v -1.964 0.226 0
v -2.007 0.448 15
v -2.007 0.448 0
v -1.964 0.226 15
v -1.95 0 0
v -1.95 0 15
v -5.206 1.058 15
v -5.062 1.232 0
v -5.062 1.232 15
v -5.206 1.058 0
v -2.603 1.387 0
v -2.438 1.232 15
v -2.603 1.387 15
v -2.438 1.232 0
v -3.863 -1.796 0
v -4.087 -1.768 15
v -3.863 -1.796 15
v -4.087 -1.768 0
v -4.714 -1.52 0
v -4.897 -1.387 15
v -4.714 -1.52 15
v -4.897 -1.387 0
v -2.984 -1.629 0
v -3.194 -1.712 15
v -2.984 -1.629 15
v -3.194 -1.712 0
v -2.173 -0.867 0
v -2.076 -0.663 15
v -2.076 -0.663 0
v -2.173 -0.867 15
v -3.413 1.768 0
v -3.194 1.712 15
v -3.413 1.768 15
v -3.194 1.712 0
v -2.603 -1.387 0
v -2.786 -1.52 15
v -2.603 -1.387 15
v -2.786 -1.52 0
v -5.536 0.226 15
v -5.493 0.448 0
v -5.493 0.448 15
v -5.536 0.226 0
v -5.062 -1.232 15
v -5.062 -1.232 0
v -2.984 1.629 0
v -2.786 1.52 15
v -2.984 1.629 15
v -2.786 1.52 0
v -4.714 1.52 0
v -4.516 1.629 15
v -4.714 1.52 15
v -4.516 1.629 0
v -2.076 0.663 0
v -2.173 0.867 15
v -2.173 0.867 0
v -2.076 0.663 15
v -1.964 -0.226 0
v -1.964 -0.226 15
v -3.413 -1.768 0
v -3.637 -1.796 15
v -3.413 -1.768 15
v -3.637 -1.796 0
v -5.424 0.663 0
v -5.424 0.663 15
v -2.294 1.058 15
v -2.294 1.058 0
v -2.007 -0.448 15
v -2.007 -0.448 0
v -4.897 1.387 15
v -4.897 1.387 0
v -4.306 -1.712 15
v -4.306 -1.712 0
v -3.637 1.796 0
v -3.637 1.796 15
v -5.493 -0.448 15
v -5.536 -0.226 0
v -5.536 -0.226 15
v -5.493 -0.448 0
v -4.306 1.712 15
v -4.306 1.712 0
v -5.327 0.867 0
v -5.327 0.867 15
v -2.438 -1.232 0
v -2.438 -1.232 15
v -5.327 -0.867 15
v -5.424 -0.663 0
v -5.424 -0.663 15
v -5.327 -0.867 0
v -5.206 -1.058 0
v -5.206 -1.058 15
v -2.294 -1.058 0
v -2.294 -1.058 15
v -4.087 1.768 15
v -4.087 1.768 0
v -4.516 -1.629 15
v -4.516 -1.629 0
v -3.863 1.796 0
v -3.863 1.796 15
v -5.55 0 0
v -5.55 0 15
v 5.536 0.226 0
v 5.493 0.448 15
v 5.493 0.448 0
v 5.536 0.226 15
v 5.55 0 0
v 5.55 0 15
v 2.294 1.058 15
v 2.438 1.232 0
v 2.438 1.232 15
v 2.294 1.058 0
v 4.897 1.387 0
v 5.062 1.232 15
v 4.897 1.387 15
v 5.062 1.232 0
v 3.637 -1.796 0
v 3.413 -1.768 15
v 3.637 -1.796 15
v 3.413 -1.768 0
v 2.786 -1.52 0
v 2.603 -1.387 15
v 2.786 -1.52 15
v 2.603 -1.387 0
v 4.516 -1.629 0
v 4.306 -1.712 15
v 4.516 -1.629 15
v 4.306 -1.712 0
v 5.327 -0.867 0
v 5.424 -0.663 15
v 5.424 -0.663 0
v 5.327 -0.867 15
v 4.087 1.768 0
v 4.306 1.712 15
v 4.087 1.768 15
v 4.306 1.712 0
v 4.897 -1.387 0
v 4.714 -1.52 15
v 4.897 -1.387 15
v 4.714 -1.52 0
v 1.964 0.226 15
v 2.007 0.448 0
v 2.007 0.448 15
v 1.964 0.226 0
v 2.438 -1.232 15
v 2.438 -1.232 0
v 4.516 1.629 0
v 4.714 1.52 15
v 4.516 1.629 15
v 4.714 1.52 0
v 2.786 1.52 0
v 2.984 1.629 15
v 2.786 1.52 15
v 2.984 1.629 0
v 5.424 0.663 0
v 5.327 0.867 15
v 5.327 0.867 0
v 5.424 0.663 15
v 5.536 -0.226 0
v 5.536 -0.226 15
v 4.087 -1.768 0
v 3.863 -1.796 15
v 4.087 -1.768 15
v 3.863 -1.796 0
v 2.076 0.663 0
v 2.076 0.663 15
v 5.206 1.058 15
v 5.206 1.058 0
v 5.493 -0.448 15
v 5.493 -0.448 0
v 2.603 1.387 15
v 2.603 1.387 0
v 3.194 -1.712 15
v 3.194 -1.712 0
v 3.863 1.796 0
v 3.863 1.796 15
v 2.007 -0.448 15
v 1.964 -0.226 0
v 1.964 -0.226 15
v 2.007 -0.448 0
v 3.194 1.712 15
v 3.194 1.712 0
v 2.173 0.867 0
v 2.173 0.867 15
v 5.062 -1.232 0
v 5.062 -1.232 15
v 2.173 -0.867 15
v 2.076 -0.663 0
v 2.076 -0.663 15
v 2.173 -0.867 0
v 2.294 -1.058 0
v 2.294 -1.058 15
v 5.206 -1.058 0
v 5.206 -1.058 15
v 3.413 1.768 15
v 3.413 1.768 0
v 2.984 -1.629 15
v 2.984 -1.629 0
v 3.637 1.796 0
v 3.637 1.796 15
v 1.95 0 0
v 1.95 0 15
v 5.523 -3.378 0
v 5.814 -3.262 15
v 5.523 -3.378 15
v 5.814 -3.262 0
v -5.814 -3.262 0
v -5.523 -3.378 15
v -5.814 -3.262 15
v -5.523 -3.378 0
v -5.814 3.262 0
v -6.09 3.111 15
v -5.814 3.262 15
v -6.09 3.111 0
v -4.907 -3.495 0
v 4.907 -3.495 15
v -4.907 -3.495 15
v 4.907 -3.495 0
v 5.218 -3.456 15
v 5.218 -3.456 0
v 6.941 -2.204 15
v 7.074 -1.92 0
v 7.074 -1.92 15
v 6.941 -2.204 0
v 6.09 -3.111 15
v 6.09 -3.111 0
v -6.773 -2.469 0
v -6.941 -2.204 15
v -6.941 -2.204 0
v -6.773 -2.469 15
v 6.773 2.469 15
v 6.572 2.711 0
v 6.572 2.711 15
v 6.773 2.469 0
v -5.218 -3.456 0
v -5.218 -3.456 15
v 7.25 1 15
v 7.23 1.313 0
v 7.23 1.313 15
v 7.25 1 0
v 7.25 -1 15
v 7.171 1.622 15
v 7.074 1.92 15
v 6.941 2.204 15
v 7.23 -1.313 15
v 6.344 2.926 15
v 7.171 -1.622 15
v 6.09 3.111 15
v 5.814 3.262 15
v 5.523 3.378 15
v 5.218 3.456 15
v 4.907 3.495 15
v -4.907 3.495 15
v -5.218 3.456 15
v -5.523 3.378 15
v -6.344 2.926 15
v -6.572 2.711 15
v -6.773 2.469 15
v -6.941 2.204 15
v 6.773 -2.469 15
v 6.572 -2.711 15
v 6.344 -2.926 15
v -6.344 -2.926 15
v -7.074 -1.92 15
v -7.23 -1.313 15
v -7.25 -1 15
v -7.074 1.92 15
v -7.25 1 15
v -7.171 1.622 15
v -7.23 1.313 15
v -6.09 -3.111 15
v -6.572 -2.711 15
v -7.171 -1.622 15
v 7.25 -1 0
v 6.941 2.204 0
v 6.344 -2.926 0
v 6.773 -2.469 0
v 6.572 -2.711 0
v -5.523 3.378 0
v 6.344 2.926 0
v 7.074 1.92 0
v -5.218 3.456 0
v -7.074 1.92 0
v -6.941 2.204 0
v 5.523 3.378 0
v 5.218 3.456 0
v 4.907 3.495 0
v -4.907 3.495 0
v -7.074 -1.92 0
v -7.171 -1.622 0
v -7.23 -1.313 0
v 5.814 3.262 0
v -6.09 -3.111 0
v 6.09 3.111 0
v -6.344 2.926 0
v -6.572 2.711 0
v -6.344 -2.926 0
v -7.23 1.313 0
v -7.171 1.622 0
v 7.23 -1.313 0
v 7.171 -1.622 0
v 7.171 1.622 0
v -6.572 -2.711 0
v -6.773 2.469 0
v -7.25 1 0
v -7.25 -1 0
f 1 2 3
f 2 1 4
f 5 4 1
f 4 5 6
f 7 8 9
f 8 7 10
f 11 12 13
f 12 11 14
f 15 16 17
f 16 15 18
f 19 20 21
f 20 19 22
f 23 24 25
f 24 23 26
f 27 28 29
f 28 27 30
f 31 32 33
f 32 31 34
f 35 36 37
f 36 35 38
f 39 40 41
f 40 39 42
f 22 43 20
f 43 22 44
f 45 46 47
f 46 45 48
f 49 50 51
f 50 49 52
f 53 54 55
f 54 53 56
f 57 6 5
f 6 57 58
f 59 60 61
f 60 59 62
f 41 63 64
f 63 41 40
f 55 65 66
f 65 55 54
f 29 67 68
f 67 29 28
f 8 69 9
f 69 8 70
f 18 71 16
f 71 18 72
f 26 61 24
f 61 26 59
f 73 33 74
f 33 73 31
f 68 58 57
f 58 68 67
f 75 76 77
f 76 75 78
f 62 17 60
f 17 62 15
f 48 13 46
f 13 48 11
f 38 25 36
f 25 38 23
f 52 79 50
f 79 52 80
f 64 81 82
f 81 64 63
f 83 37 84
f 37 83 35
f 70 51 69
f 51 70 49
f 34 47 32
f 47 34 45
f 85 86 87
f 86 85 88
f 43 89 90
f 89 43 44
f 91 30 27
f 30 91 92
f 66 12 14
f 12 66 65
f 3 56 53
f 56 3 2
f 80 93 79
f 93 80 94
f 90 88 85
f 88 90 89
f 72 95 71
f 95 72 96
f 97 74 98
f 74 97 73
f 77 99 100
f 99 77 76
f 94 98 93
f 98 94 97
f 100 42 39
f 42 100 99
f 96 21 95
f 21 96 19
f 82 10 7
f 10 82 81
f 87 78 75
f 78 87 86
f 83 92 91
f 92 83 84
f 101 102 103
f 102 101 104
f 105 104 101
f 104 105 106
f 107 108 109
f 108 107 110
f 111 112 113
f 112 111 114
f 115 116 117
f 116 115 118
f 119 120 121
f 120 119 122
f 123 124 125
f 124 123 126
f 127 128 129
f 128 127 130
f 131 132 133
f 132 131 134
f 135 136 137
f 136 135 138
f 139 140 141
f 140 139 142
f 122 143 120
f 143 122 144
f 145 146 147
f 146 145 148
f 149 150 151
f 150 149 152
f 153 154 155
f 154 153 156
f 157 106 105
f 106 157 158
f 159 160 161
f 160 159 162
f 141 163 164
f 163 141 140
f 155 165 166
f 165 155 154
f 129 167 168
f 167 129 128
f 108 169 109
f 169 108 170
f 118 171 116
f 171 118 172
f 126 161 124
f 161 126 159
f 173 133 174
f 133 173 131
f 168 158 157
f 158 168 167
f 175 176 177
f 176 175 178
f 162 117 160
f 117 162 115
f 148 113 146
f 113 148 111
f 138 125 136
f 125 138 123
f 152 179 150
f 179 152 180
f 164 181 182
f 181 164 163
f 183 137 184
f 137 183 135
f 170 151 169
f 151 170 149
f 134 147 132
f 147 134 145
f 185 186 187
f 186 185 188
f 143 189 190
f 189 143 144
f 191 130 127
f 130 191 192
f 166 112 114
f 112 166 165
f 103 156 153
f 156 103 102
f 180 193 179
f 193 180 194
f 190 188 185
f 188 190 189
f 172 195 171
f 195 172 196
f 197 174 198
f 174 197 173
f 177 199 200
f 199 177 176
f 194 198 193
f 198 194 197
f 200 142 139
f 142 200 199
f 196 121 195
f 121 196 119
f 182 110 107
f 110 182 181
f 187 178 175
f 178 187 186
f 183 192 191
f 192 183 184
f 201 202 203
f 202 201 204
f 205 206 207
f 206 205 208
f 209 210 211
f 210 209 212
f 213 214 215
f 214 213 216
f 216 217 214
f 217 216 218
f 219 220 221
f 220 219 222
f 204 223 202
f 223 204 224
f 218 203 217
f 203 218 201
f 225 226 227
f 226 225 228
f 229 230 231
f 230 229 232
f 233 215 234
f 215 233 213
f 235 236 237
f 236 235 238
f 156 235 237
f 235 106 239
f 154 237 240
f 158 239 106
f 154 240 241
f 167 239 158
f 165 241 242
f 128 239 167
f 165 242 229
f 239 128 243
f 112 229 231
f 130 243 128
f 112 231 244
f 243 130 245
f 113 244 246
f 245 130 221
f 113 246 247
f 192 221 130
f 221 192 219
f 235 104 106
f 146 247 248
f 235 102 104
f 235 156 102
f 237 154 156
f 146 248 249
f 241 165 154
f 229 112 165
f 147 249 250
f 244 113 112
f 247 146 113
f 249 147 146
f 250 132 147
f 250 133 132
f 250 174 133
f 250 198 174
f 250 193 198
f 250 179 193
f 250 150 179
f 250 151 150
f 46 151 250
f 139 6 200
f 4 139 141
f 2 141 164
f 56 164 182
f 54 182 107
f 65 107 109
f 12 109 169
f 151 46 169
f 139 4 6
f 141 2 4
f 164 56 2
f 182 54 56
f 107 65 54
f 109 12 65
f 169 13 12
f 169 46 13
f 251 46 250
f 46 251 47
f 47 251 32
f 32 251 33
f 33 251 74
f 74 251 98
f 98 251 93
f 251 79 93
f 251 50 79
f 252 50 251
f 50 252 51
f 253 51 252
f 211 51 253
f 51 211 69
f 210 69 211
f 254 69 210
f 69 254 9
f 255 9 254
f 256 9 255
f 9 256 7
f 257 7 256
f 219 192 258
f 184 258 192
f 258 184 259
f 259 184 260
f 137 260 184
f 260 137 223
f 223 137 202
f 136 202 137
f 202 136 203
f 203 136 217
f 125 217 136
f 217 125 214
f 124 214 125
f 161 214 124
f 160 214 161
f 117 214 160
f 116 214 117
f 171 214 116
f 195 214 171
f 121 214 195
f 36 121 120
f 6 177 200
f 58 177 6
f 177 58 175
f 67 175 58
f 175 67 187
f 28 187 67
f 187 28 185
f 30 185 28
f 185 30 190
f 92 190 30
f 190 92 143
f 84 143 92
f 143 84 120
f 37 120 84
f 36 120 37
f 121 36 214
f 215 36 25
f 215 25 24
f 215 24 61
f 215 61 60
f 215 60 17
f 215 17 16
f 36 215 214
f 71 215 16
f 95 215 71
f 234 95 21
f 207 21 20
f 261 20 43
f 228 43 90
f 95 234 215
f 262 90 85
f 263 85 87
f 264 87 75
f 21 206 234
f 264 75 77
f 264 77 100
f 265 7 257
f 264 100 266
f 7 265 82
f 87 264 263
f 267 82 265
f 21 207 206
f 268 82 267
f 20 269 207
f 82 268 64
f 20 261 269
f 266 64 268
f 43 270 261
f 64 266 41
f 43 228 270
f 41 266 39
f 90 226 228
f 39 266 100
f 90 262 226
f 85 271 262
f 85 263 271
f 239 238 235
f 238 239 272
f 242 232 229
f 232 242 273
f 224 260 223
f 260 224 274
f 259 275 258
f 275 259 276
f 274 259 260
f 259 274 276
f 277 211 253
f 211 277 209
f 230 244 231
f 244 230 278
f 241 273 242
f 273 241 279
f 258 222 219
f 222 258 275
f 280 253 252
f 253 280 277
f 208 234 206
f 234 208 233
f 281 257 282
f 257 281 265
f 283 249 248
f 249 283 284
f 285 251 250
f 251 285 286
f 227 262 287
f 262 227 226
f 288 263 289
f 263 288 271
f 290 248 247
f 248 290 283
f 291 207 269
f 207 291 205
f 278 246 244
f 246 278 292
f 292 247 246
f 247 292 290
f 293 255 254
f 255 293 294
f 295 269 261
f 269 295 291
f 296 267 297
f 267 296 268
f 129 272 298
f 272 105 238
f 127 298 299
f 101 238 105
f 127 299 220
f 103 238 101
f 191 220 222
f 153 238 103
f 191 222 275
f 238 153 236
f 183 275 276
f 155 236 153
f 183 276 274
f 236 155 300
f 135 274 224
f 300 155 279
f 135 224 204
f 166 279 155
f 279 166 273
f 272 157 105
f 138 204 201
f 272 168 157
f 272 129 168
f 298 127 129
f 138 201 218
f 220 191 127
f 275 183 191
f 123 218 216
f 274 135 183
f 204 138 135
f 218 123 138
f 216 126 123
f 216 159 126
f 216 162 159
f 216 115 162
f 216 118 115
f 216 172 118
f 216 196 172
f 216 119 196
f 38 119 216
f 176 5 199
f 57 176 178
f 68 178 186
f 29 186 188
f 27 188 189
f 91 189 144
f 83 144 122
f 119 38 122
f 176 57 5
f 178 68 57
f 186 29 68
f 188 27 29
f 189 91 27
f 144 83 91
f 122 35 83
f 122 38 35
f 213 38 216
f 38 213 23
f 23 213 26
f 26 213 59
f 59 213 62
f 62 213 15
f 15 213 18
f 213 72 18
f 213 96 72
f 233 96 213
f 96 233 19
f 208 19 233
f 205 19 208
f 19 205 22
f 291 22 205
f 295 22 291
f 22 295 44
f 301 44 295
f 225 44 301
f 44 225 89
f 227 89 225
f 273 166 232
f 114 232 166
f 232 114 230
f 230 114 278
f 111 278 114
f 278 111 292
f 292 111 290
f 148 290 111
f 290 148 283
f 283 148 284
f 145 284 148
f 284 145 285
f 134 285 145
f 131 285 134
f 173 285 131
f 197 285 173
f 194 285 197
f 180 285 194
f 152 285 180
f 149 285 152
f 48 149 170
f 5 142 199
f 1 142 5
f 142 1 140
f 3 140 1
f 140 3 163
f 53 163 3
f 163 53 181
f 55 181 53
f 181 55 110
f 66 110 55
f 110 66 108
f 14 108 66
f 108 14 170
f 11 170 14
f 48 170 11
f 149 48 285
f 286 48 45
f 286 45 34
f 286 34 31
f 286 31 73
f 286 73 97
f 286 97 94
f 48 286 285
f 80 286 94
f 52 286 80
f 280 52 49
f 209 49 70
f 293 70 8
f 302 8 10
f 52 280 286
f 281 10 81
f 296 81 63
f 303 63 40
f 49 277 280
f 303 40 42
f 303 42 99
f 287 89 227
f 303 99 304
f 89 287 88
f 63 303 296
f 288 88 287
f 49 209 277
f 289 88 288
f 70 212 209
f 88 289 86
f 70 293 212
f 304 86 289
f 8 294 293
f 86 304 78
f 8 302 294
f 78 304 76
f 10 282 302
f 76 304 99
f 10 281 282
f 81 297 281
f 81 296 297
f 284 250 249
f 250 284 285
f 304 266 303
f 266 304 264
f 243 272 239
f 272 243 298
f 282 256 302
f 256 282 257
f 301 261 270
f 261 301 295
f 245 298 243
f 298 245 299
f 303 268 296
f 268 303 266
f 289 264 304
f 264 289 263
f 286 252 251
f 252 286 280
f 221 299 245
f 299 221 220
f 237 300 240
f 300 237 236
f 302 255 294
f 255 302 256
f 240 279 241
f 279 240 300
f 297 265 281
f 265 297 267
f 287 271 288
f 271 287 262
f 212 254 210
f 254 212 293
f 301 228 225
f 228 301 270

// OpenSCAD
$fn = 50;


difference() {
	union() {
		translate(v = [0, 0, 0]) {
			rotate(a = [0, 0, 0]) {
				hull() {
					translate(v = [-4.7500000000, 1.0000000000, 0]) {
						rotate(a = [0, 0, 0]) {
							translate(v = [0, 0, 0]) {
								rotate(a = [0, 0, 0]) {
									cylinder(h = 15, r = 2.5000000000);
								}
							}
						}
					}
					translate(v = [4.7500000000, 1.0000000000, 0]) {
						rotate(a = [0, 0, 0]) {
							translate(v = [0, 0, 0]) {
								rotate(a = [0, 0, 0]) {
									cylinder(h = 15, r = 2.5000000000);
								}
							}
						}
					}
					translate(v = [-4.7500000000, -1.0000000000, 0]) {
						rotate(a = [0, 0, 0]) {
							translate(v = [0, 0, 0]) {
								rotate(a = [0, 0, 0]) {
									cylinder(h = 15, r = 2.5000000000);
								}
							}
						}
					}
					translate(v = [4.7500000000, -1.0000000000, 0]) {
						rotate(a = [0, 0, 0]) {
							translate(v = [0, 0, 0]) {
								rotate(a = [0, 0, 0]) {
									cylinder(h = 15, r = 2.5000000000);
								}
							}
						}
					}
				}
			}
		}
	}
	union() {
		translate(v = [-3.7500000000, 0.0000000000, 0]) {
			rotate(a = [0, 0, 0]) {
				translate(v = [0, 0, -50]) {
					rotate(a = [0, 0, 0]) {
						cylinder(h = 100, r = 1.8000000000);
					}
				}
			}
		}
		translate(v = [3.7500000000, 0.0000000000, 0]) {
			rotate(a = [0, 0, 0]) {
				translate(v = [0, 0, -50]) {
					rotate(a = [0, 0, 0]) {
						cylinder(h = 100, r = 1.8000000000);
					}
				}
			}
		}
	}
}
